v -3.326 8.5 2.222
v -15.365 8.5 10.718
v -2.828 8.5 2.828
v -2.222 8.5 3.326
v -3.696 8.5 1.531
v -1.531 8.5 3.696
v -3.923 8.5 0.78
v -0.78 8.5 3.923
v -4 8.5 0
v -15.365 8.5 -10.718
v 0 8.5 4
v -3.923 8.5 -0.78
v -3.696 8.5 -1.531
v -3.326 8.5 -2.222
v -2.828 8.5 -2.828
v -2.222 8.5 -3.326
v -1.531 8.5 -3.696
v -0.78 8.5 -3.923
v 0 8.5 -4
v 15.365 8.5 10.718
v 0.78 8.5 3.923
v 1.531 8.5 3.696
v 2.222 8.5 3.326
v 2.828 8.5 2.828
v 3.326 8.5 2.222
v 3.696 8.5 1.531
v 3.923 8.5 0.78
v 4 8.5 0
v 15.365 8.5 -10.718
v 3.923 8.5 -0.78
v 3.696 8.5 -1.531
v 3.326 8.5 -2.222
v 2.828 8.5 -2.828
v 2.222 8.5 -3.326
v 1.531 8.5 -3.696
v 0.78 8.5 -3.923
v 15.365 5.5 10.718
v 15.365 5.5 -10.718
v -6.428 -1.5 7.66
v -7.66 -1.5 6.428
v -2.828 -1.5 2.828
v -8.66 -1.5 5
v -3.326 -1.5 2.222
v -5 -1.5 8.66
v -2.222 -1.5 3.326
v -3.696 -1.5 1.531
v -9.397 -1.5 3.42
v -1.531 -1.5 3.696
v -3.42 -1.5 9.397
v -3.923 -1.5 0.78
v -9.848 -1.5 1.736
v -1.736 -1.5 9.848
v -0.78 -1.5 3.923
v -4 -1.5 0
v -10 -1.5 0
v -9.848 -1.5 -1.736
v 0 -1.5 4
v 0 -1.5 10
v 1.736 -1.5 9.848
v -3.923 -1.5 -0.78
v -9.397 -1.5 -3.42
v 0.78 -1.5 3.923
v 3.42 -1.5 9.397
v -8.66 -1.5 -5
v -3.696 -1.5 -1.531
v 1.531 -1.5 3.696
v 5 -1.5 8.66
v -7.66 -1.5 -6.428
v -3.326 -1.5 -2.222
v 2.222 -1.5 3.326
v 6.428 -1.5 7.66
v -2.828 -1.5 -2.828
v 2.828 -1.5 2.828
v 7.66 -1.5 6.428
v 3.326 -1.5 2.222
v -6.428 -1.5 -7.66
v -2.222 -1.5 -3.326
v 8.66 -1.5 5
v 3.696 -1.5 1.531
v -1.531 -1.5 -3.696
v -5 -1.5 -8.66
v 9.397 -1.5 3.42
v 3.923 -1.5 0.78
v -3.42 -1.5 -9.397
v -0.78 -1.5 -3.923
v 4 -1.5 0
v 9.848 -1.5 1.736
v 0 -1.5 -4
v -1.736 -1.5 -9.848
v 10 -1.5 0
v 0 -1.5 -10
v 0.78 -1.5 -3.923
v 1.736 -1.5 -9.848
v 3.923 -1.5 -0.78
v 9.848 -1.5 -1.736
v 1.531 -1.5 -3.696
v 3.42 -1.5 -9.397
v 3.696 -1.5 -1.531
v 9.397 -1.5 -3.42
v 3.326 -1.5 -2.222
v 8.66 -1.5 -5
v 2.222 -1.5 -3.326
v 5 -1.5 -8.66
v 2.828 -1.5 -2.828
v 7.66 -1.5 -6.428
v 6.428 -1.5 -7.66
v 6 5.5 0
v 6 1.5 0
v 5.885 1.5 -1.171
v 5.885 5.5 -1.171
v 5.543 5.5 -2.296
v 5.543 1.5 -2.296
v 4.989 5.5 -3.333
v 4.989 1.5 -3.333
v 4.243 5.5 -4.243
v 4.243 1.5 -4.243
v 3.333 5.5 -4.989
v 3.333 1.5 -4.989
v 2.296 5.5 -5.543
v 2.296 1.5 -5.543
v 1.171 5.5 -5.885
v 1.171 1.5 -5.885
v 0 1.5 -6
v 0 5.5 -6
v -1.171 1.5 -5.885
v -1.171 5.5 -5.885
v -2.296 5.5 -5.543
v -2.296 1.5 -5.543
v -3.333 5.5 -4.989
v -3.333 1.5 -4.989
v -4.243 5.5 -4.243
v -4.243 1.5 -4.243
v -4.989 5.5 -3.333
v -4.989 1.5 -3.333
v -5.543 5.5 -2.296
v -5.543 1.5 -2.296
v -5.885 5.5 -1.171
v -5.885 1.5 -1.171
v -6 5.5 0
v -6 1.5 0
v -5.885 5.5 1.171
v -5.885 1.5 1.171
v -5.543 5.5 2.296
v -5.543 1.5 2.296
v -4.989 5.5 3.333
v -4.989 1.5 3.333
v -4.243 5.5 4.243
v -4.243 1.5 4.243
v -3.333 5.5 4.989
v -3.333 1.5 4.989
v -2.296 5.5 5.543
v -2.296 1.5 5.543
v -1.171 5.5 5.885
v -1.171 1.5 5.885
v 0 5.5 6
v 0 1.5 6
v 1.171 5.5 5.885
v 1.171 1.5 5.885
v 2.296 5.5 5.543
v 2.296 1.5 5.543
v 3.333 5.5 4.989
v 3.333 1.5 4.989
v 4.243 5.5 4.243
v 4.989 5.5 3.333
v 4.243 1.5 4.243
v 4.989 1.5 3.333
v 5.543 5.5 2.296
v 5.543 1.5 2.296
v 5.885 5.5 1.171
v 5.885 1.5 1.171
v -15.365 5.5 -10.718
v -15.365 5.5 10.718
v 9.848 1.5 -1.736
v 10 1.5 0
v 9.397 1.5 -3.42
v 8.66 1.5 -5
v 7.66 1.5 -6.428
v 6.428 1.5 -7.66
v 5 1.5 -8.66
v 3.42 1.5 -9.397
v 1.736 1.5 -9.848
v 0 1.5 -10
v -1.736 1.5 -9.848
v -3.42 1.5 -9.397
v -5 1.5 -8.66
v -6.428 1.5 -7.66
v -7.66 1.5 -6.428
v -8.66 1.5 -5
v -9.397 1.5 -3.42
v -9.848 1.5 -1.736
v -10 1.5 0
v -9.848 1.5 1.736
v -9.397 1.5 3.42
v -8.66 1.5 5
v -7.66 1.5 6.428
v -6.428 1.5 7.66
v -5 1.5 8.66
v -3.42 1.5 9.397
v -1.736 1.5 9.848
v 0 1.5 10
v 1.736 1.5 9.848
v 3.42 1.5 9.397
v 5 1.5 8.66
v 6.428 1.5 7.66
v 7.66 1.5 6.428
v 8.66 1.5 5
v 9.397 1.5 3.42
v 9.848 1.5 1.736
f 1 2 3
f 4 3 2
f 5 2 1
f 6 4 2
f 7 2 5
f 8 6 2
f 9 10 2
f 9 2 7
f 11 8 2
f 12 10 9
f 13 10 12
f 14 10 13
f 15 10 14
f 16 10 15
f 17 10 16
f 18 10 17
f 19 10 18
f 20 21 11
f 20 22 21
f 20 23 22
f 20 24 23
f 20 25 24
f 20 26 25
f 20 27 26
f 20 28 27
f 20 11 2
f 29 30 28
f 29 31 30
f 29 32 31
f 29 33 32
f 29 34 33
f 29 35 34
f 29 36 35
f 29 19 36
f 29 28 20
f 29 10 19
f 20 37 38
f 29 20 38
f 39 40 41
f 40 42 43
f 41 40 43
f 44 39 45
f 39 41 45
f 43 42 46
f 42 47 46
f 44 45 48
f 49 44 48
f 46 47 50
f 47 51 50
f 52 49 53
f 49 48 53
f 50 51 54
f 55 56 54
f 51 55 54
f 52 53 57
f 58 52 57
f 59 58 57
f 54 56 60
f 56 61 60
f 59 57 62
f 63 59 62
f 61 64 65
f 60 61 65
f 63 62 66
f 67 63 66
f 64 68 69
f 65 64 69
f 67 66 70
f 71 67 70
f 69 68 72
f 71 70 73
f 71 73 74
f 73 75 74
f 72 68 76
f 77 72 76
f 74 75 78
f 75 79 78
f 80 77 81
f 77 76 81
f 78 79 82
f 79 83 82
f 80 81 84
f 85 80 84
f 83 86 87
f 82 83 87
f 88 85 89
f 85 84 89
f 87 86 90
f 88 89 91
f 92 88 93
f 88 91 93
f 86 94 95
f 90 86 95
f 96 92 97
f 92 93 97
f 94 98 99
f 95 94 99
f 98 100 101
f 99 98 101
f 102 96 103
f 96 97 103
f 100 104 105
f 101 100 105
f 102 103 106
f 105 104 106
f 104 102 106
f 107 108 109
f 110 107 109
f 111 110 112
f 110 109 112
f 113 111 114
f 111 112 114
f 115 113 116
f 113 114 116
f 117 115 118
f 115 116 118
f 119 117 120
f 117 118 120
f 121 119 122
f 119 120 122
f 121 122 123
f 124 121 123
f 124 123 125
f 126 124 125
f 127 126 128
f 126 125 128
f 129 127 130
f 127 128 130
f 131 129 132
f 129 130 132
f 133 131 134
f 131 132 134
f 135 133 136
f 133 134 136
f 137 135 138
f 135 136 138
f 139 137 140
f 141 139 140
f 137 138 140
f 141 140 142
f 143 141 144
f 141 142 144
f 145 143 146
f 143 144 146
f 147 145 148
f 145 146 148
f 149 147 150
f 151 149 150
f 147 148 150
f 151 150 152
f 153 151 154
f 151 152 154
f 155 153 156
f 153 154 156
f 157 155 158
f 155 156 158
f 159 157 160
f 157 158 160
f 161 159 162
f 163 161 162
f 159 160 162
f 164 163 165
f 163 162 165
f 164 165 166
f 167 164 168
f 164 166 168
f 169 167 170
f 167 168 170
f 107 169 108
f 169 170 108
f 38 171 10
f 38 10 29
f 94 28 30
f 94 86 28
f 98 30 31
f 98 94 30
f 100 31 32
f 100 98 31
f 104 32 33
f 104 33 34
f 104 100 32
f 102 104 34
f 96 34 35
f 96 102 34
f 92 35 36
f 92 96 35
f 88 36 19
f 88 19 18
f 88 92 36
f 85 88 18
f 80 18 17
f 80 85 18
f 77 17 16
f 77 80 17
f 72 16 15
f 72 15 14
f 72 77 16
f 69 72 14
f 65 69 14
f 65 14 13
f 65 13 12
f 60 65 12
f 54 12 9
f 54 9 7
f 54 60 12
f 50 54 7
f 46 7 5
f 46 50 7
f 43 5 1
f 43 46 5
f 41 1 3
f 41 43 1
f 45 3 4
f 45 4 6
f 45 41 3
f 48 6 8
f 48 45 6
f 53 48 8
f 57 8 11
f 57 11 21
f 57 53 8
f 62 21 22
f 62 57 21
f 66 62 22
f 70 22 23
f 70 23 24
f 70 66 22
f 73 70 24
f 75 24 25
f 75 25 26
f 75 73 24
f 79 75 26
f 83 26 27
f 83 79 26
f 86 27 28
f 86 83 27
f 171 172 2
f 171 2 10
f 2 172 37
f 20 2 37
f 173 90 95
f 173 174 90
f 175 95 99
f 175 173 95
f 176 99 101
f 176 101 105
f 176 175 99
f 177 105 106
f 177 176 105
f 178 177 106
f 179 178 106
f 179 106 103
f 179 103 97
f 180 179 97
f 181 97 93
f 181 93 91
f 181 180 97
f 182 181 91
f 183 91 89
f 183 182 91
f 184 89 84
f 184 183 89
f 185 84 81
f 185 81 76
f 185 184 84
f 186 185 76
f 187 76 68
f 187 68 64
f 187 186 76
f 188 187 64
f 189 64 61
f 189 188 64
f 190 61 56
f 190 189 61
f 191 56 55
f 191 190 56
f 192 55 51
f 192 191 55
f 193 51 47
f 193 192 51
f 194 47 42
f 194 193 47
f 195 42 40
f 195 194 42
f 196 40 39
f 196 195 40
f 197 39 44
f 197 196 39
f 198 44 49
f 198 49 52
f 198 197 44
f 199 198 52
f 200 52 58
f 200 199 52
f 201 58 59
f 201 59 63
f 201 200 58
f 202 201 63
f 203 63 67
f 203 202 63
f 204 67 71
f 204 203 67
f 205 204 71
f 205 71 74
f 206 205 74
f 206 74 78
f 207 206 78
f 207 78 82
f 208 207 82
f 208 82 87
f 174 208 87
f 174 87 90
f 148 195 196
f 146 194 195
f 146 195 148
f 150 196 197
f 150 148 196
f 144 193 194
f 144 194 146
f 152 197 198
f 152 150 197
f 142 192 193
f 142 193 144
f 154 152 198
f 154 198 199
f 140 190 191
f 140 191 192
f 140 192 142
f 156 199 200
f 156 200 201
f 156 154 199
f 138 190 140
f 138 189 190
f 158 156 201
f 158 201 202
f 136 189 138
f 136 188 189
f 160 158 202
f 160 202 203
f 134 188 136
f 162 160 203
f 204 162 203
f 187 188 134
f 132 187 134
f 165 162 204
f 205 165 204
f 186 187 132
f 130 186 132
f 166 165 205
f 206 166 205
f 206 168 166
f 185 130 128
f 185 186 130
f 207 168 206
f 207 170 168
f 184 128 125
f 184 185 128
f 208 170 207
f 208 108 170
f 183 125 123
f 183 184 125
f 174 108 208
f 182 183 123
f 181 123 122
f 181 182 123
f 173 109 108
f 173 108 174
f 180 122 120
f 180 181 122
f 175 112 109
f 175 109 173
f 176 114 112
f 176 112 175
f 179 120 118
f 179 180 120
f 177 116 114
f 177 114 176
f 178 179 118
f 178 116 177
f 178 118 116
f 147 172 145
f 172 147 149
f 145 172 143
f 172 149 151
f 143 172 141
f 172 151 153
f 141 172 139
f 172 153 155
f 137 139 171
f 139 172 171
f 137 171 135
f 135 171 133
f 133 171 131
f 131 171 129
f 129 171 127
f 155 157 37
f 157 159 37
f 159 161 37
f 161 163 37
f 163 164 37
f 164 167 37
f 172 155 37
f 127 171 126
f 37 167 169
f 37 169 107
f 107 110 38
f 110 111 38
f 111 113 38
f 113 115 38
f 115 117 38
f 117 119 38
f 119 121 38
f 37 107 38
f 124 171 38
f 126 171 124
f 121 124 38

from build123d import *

# Parameters (mm, degrees)
SKETCH1_R           = 10
SKETCH1_R_2         = 4
BOSS_EXTRUDE1_DEPTH = 1.5
SKETCH2_R           = 6
SKETCH2_R_2         = 4
BOSS_EXTRUDE2_DEPTH = 4
SKETCH3_W           = 30.73076969
SKETCH3_H           = 21.435526278
SKETCH3_R           = 4
BOSS_EXTRUDE3_DEPTH = 3


with BuildPart() as part:
    # Sketch1 → Boss-Extrude1 (new body, symmetric)
    with BuildSketch(Plane(origin=(0, 0, 0), x_dir=(1, 0, 0), z_dir=(0, 1, 0))):
        Circle(SKETCH1_R)
        Circle(SKETCH1_R_2, mode=Mode.SUBTRACT)
    extrude(amount=BOSS_EXTRUDE1_DEPTH, both=True)

    # Sketch2 → Boss-Extrude2 (add)
    with BuildSketch(Plane(origin=(0, 1.5, 0), x_dir=(1, 0, 0), z_dir=(0, 1, 0))):
        Circle(SKETCH2_R)
        Circle(SKETCH2_R_2, mode=Mode.SUBTRACT)
    extrude(amount=BOSS_EXTRUDE2_DEPTH)

    # Sketch3 → Boss-Extrude3 (add)
    with BuildSketch(Plane(origin=(0, 5.5, 0), x_dir=(1, 0, 0), z_dir=(0, 1, 0))):
        Rectangle(SKETCH3_W, SKETCH3_H)
        Circle(SKETCH3_R, mode=Mode.SUBTRACT)
    extrude(amount=BOSS_EXTRUDE3_DEPTH)


solid = part.part
